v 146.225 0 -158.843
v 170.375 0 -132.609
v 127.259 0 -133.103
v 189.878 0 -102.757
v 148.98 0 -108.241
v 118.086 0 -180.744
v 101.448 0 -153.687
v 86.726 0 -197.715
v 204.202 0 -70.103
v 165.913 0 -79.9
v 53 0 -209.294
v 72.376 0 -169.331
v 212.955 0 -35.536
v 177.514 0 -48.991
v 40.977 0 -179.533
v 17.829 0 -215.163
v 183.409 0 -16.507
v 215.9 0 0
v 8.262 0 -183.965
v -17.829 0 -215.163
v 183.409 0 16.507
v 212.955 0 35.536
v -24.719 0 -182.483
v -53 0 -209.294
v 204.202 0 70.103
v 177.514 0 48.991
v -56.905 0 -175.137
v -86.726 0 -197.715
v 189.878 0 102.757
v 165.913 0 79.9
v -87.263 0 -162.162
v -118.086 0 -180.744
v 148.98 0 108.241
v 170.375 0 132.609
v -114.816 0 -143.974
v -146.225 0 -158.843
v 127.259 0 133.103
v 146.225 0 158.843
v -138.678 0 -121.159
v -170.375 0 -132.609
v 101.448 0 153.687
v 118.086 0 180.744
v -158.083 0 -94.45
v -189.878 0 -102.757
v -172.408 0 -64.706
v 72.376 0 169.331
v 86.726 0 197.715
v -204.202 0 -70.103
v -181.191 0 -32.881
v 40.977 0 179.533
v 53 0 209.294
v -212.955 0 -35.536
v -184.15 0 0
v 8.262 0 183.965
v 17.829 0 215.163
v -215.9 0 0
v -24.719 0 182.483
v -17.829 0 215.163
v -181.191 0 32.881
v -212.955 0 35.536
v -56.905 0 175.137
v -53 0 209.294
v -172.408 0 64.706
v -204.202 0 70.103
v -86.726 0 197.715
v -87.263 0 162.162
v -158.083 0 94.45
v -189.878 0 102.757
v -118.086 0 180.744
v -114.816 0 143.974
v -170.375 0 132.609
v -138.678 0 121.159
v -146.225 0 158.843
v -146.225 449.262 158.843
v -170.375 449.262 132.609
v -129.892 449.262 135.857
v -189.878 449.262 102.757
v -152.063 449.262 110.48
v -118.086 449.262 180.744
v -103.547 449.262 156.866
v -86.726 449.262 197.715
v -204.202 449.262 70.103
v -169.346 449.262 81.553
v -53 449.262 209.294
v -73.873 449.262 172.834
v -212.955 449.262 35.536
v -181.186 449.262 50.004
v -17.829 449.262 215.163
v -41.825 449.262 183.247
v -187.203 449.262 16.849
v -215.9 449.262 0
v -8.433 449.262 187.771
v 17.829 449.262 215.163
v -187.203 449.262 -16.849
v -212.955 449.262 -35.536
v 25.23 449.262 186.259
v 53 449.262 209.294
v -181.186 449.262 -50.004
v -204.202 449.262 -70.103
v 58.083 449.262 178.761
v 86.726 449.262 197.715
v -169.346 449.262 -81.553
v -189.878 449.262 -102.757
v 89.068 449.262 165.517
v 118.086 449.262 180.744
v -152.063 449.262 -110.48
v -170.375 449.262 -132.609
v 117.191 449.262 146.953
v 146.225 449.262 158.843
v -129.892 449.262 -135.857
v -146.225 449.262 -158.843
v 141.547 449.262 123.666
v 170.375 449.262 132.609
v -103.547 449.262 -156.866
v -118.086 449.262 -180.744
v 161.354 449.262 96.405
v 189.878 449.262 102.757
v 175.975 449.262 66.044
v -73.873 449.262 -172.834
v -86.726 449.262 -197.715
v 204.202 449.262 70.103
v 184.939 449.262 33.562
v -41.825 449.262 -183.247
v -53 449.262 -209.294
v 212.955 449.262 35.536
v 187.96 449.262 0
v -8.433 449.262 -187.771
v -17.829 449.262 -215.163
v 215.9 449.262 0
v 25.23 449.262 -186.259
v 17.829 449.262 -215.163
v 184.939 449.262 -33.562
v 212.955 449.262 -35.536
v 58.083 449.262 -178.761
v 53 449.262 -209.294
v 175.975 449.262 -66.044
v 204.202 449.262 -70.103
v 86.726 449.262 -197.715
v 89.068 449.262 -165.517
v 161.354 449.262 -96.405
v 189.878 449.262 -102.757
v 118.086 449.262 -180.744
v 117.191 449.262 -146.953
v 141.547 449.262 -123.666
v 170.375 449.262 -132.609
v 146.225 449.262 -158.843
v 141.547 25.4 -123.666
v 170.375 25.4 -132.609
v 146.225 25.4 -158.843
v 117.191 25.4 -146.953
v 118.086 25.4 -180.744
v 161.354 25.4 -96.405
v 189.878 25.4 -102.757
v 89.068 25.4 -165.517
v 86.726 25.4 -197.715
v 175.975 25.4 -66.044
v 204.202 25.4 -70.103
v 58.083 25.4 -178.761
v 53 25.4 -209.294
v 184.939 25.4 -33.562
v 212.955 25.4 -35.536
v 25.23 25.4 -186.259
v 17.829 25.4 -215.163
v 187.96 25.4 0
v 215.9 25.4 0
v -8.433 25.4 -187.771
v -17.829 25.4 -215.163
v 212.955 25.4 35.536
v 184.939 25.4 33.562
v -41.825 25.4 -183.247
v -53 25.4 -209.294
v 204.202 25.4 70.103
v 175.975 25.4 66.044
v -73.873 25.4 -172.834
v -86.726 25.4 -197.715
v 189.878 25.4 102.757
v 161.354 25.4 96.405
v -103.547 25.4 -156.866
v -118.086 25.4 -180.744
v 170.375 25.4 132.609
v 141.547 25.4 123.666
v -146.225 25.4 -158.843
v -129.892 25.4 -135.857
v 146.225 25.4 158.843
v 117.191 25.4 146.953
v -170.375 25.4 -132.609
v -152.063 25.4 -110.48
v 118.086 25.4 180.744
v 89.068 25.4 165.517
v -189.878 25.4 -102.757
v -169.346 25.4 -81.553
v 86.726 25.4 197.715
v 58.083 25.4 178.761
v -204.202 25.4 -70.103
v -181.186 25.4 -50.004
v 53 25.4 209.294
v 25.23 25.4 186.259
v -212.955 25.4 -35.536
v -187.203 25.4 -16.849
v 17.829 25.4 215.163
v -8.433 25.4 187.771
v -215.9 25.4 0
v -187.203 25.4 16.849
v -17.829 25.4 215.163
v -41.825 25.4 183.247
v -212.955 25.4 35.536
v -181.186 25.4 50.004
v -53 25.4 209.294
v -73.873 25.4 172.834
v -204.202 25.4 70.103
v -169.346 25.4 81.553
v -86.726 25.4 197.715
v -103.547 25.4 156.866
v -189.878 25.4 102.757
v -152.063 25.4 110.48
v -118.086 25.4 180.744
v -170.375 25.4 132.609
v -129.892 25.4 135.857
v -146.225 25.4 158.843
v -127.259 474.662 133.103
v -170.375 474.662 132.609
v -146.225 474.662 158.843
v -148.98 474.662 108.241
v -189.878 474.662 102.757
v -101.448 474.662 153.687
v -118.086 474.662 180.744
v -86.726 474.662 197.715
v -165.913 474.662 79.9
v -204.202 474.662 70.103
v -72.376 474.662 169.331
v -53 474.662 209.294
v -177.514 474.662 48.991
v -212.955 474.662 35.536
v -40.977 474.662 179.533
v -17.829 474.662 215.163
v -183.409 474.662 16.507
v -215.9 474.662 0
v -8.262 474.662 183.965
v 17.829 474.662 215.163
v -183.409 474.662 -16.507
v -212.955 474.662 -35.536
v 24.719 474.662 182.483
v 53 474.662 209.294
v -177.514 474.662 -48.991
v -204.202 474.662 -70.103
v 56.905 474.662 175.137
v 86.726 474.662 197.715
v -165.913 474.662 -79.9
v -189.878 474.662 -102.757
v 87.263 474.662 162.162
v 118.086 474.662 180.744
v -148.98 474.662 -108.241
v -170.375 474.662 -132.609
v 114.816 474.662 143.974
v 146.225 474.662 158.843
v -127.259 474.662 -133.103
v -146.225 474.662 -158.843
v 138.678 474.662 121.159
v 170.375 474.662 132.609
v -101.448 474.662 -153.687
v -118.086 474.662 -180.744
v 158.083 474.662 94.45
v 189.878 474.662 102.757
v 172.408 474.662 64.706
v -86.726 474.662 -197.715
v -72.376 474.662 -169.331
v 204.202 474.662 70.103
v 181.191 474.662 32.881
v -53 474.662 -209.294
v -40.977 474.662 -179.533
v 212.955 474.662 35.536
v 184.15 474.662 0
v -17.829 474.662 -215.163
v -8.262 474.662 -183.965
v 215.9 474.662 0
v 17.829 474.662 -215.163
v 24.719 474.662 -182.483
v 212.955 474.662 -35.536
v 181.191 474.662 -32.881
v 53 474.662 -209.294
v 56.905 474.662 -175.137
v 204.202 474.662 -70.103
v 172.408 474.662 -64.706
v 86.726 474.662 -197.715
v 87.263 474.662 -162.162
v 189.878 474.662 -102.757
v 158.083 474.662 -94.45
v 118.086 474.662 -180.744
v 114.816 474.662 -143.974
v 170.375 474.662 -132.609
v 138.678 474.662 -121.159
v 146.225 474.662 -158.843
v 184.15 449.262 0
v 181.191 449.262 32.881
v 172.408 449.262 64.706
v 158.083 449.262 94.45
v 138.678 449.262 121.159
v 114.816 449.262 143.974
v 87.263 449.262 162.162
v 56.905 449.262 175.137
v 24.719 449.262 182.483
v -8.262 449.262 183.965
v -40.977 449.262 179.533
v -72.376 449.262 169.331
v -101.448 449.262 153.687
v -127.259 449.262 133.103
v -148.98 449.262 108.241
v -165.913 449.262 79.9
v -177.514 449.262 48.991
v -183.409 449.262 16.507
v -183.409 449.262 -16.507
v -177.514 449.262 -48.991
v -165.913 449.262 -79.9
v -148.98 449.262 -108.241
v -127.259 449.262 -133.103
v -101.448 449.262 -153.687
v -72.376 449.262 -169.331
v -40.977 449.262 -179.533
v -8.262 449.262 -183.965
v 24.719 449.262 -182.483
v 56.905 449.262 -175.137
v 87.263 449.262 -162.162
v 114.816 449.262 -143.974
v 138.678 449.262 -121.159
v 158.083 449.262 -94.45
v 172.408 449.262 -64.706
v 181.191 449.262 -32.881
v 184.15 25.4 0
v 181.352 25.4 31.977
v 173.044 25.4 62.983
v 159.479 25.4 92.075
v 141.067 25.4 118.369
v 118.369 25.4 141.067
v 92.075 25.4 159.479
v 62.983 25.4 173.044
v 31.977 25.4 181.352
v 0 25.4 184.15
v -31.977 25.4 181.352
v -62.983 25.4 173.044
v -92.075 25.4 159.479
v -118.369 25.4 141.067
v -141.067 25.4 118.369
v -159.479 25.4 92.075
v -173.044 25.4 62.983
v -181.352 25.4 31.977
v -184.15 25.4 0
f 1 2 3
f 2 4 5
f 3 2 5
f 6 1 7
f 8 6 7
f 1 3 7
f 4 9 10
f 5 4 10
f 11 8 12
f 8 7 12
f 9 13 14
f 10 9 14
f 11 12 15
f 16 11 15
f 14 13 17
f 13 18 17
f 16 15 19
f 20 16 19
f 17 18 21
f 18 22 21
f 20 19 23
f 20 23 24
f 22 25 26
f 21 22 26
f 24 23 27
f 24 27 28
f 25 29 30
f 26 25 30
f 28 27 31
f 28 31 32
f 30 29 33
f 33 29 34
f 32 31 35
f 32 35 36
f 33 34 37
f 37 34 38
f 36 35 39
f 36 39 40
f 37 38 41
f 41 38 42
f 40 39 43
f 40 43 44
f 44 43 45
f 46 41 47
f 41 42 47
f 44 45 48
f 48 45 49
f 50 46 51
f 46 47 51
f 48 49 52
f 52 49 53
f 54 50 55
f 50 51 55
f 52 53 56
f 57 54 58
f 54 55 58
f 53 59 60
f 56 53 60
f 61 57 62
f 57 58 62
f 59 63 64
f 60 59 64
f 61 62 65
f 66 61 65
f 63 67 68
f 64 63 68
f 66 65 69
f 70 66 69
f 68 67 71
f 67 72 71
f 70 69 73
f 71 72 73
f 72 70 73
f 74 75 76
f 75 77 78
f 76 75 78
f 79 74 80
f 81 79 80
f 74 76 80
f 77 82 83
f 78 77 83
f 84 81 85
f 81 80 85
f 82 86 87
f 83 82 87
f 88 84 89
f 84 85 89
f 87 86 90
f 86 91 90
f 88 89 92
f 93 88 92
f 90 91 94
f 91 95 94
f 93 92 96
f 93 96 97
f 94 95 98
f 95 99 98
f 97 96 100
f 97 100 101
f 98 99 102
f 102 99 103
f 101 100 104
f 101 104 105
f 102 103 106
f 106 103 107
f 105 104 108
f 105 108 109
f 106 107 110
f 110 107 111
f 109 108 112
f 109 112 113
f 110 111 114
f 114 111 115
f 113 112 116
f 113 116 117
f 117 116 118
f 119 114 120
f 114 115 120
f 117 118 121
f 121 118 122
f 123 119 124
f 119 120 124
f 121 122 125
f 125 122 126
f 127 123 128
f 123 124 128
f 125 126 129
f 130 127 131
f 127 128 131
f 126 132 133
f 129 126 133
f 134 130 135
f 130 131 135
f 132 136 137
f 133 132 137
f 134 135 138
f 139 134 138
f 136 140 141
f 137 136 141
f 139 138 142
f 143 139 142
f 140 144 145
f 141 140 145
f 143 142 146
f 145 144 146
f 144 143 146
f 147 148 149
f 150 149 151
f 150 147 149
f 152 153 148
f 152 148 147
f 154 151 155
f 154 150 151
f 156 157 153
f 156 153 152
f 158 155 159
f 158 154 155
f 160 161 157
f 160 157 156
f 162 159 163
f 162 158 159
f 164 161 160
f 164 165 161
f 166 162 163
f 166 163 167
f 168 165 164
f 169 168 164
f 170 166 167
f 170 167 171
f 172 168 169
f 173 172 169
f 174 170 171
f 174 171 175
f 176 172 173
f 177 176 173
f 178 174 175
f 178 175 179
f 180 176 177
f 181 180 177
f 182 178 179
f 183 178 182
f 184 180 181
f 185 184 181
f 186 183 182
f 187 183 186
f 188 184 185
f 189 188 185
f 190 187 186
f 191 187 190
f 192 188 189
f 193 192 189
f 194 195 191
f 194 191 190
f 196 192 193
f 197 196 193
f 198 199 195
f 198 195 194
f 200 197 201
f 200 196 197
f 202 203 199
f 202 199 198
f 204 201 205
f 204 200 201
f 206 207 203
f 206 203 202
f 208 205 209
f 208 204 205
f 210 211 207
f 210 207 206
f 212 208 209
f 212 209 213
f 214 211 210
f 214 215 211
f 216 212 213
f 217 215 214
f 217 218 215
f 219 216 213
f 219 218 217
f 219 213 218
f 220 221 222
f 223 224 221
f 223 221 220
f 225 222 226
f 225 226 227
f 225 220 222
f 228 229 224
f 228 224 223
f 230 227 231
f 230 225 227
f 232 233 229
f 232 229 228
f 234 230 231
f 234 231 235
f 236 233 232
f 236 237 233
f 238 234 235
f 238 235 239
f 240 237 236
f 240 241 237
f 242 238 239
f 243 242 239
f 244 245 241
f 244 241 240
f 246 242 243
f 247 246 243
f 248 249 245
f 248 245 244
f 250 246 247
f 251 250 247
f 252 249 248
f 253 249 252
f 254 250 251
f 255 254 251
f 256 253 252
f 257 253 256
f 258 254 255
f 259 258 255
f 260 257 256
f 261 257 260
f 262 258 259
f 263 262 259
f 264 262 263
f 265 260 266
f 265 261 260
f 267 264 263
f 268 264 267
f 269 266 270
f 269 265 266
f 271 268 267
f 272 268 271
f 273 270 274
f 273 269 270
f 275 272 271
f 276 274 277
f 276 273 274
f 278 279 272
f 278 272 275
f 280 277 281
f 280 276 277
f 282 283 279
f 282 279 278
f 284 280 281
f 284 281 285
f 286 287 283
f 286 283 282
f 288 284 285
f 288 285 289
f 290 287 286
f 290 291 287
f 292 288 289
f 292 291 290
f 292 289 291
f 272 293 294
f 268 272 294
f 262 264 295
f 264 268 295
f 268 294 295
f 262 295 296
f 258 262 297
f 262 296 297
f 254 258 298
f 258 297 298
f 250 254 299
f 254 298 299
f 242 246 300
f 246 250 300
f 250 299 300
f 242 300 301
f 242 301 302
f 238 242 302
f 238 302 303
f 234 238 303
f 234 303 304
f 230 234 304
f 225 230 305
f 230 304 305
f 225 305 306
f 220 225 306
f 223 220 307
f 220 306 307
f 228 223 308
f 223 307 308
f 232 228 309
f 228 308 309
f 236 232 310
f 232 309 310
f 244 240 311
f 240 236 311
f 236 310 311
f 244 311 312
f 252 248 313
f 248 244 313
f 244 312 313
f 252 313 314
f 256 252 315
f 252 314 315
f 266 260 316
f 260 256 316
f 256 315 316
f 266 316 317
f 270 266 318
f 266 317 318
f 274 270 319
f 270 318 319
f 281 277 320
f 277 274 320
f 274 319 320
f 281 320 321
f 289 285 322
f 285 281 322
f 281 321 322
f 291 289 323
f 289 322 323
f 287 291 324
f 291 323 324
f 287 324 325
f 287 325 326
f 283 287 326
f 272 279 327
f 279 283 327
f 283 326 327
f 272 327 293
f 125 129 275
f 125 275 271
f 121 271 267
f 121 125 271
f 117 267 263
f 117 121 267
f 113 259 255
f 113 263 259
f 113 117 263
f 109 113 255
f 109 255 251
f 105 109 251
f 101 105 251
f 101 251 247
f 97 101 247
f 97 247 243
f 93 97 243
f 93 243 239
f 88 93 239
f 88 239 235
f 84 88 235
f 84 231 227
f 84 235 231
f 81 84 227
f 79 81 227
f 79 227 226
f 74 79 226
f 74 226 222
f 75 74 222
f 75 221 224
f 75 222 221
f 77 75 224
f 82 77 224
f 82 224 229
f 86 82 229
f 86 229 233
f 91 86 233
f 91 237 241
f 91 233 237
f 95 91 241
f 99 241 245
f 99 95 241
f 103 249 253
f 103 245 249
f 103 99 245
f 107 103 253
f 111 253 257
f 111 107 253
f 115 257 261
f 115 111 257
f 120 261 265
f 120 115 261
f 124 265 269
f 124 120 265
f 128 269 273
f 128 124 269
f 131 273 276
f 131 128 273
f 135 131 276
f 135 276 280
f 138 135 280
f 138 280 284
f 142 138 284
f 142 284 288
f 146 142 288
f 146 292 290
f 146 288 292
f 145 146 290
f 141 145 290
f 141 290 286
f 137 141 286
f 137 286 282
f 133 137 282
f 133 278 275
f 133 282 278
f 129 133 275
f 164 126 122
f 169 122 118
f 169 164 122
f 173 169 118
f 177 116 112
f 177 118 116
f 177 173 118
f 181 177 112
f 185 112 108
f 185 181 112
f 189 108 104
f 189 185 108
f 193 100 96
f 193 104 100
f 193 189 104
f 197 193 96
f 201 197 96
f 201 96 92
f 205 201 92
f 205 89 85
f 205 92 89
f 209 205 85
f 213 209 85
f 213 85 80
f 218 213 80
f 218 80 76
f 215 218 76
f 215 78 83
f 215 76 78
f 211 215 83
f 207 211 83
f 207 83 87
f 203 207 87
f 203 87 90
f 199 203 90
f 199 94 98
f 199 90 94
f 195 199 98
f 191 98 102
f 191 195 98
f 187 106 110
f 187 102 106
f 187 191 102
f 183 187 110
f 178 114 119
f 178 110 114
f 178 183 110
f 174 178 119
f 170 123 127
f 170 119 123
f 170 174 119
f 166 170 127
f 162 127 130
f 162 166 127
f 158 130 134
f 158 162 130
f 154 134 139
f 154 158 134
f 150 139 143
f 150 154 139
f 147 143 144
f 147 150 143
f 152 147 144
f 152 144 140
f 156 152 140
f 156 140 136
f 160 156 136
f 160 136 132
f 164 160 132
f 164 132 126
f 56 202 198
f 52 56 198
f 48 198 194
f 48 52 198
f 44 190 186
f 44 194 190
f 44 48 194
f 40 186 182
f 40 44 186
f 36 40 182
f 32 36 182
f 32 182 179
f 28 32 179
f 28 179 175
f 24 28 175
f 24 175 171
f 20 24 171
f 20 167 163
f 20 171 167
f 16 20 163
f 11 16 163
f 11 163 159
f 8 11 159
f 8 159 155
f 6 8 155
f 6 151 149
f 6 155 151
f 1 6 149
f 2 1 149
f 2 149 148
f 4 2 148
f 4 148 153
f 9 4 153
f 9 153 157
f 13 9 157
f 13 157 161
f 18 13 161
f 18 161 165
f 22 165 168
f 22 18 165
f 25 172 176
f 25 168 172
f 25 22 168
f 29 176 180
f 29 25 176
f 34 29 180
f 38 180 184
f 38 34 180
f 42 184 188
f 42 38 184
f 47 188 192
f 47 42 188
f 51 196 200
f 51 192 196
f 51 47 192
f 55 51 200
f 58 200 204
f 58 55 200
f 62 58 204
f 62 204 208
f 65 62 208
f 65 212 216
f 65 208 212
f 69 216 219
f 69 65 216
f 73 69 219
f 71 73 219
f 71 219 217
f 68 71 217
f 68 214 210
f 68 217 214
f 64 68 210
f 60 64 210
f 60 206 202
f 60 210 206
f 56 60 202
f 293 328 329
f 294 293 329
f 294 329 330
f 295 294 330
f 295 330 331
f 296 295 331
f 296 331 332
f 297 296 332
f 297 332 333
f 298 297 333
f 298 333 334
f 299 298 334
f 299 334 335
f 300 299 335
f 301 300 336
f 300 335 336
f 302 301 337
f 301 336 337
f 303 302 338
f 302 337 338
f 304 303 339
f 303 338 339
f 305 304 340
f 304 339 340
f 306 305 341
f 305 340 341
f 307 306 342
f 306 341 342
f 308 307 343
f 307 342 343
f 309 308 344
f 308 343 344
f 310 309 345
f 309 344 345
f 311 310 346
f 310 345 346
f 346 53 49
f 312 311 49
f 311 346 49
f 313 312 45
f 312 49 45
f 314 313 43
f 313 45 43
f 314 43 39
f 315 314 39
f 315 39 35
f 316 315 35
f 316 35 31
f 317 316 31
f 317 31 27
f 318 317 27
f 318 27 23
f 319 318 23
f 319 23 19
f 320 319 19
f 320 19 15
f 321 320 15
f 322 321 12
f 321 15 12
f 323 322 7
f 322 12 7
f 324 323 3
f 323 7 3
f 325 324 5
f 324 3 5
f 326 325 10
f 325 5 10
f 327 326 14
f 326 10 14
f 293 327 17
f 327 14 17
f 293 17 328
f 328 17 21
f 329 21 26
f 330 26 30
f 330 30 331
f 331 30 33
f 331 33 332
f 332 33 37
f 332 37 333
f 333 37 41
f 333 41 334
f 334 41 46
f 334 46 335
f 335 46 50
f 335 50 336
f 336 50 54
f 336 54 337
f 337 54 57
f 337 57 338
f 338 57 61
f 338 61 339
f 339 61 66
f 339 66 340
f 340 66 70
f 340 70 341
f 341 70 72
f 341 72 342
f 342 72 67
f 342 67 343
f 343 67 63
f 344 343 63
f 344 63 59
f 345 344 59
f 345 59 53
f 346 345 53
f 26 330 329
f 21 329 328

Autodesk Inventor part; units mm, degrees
ref_plane "YZ Plane" through (0, 0, 0) normal (1, 0, 0) x (0, 1, 0)
ref_plane "XZ Plane" through (0, 0, 0) normal (0, 1, 0) x (-1, 0, 0)
ref_plane "XY Plane" through (0, 0, 0) normal (0, 0, 1) x (1, 0, 0)
sketch "Sketch1" plane through (0, 0, 0) normal (0, 1, 0) x (-1, 0, 0)
  circle A0 centre (0, 0) radius 184.15
  circle A1 centre (0, 0) radius 215.9
  dimension "d0" = 368.3
  dimension "d1" = 431.8
extrude "Extrusion1" add sketch "Sketch1" along normal blind 25.4
sketch "Sketch2" plane through (0, 25.4, 0) normal (0, 1, 0) x (1, 0, 0)
  circle A0 centre (0, 0) radius 184.15
  circle A1 centre (0, 0) radius 187.96
  dimension "d4" = 368.3
  dimension "d5" = 375.92
extrude "Extrusion2" add sketch "Sketch2" along normal blind 423.8625
sketch "Sketch3" plane through (0, 449.2625, 0) normal (0, 1, 0) x (1, 0, 0)
  circle A0 centre (0, 0) radius 184.15
  circle A1 centre (0, 0) radius 215.9
  dimension "d8" = 368.3
  dimension "d9" = 431.8
extrude "Extrusion3" add sketch "Sketch3" along normal blind 25.4
properties part number "Radiation Sheild 55K" material "Aluminum 6061"
